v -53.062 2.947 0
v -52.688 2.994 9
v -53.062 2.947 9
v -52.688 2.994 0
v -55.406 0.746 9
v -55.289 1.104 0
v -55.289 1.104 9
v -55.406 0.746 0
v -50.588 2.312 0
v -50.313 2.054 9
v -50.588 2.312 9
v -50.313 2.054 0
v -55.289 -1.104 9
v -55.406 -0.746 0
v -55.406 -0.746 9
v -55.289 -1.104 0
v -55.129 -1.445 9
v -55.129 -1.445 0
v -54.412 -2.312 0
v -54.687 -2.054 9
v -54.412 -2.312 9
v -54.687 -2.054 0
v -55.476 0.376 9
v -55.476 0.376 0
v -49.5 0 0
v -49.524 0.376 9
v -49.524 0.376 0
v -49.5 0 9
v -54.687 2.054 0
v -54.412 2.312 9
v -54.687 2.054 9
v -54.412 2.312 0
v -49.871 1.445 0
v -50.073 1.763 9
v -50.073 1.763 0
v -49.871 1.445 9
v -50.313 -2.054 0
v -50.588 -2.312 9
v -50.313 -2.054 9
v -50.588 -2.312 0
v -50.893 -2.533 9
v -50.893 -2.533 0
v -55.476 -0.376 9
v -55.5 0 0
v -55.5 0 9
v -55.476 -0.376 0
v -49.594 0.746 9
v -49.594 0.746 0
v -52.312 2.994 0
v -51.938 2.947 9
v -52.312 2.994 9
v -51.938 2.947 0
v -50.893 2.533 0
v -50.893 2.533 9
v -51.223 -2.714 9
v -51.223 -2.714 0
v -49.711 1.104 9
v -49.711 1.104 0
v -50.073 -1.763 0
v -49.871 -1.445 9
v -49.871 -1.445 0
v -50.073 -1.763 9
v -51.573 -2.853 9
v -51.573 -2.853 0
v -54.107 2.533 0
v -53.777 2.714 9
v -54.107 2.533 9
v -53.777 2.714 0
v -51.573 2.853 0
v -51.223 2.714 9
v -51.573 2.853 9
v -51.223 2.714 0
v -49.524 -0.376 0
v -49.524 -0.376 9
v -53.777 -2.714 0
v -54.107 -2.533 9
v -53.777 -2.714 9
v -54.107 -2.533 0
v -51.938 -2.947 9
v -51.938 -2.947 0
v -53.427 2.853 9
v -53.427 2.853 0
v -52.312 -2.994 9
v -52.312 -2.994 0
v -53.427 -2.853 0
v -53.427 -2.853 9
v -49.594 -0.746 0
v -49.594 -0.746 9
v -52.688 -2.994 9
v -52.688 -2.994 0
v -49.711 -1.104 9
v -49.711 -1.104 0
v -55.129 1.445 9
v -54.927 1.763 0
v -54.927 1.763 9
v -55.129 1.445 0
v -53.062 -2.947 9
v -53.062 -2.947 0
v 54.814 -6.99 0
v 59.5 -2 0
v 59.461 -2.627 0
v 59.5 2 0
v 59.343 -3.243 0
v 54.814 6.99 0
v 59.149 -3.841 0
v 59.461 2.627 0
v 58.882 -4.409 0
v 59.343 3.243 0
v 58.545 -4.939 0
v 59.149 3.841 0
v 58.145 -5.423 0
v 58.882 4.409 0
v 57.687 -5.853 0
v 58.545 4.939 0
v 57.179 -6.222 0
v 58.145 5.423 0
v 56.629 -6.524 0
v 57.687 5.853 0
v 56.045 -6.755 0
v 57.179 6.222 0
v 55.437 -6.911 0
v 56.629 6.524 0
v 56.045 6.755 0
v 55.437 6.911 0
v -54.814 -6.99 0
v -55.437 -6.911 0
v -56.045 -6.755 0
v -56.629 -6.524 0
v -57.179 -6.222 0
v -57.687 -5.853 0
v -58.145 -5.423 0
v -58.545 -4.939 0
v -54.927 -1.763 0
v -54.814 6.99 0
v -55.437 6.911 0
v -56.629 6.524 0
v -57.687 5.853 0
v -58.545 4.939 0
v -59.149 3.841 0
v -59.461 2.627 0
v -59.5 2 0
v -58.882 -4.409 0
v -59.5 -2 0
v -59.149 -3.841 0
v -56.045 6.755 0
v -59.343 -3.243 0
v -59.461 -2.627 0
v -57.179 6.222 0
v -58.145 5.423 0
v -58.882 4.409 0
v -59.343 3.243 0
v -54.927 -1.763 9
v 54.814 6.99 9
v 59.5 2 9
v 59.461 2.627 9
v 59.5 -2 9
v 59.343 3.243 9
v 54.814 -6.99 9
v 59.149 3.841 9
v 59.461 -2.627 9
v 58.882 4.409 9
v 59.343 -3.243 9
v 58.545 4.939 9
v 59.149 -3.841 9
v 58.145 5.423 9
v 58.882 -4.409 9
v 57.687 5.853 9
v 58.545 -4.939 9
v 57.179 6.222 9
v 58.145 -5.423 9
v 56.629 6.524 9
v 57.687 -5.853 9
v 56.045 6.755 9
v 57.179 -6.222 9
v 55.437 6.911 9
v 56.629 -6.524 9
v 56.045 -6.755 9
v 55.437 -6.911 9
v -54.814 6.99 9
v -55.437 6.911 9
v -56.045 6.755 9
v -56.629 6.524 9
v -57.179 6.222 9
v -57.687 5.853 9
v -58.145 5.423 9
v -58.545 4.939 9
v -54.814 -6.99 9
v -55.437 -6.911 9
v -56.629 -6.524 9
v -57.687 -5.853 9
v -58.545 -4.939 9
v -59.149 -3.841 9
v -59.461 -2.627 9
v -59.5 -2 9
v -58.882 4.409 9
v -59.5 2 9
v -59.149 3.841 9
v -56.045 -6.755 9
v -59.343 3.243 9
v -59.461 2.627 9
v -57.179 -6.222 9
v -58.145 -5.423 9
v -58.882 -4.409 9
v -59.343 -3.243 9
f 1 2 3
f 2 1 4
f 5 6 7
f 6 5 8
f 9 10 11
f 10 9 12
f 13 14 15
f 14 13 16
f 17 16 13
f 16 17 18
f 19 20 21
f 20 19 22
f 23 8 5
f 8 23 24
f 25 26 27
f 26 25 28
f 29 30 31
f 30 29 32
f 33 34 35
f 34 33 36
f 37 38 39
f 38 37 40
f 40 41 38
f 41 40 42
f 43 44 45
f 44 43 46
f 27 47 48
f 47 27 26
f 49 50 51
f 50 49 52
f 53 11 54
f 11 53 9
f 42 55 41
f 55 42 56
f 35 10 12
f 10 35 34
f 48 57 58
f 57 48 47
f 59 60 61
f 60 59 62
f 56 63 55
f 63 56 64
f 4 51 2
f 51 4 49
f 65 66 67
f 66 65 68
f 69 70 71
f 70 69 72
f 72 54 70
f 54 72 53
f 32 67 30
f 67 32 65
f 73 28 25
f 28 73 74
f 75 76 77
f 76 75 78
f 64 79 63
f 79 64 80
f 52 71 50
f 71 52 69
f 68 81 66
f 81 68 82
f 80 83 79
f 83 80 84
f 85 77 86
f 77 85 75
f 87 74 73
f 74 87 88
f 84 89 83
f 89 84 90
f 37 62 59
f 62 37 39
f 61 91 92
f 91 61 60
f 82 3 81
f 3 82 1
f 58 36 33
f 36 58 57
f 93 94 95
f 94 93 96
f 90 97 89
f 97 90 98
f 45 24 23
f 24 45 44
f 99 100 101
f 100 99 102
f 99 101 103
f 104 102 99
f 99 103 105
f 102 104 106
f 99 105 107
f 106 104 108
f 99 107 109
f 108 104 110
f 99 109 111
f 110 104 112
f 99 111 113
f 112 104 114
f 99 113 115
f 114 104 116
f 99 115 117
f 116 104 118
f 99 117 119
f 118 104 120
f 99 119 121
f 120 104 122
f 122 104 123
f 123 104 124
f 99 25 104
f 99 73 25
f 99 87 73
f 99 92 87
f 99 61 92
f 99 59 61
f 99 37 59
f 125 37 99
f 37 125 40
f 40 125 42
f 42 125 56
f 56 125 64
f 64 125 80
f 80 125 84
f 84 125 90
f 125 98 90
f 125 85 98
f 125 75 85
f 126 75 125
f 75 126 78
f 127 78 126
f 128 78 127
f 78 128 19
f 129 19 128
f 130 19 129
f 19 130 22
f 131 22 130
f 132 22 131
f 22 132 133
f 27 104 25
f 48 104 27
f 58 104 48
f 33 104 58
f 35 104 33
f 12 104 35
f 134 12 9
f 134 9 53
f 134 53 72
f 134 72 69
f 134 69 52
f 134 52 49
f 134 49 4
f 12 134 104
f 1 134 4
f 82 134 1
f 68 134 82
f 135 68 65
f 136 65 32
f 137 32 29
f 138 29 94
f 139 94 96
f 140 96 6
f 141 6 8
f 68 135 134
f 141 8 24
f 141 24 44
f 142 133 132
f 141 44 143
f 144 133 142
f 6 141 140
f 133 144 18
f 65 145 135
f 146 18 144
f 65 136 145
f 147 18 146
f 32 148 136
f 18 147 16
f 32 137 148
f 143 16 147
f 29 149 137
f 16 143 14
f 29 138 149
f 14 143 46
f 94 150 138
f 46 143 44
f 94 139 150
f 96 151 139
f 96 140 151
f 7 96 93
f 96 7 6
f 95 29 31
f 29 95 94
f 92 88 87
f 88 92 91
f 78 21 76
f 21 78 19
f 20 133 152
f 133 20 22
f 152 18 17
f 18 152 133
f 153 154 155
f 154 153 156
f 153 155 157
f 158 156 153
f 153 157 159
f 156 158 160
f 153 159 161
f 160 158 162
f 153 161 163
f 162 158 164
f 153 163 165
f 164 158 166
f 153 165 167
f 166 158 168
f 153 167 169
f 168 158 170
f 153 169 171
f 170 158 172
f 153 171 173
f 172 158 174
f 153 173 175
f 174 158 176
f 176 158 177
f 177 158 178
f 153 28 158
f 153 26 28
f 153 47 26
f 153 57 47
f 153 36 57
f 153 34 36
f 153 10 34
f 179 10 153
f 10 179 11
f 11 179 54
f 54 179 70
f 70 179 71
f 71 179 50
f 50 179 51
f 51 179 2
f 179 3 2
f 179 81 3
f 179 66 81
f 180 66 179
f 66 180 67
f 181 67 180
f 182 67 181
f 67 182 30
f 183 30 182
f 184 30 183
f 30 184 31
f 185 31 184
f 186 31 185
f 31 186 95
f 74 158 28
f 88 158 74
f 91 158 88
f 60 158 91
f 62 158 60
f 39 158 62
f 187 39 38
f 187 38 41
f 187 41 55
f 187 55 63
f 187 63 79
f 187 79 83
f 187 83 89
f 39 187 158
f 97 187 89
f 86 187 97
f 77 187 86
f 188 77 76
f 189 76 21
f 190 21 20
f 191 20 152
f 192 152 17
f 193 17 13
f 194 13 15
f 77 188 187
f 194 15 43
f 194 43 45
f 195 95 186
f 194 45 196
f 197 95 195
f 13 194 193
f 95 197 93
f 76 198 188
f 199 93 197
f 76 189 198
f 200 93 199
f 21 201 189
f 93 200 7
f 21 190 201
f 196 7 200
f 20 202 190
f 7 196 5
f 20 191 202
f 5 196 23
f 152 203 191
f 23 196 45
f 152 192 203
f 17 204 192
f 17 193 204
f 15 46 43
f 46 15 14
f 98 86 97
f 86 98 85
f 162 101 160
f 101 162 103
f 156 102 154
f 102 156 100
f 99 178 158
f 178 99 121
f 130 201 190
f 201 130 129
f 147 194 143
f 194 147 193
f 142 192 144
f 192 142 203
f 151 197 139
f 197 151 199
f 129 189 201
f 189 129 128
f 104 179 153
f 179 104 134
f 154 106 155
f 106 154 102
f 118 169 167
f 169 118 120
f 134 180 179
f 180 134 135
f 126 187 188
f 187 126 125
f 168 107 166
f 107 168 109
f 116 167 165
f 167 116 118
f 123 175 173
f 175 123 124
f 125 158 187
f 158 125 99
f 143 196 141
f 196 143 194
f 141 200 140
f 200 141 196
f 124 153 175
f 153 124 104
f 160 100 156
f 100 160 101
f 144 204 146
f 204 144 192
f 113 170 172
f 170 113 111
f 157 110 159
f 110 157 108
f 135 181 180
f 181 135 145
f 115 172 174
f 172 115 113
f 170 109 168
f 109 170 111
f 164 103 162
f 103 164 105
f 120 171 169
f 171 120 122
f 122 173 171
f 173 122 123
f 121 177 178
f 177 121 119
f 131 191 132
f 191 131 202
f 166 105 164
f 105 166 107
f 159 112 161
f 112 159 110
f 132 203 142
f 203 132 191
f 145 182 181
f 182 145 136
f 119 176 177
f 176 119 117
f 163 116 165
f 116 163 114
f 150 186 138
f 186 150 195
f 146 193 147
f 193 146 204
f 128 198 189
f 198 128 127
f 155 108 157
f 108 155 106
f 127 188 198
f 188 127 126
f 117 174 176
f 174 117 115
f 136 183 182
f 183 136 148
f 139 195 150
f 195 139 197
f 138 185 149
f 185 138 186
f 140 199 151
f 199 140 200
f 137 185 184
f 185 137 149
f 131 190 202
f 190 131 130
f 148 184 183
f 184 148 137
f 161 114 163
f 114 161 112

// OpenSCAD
$fn = 50;


difference() {
	union() {
		hull() {
			translate(v = [-54.5000000000, 2.0000000000, 0]) {
				cylinder(h = 9, r = 5);
			}
			translate(v = [54.5000000000, 2.0000000000, 0]) {
				cylinder(h = 9, r = 5);
			}
			translate(v = [-54.5000000000, -2.0000000000, 0]) {
				cylinder(h = 9, r = 5);
			}
			translate(v = [54.5000000000, -2.0000000000, 0]) {
				cylinder(h = 9, r = 5);
			}
		}
	}
	union() {
		translate(v = [-52.5000000000, 0.0000000000, 0]) {
			cylinder(h = 9, r = 3.0000000000);
		}
		translate(v = [-52.5000000000, 0.0000000000, 0]) {
			cylinder(h = 9, r = 1.5000000000);
		}
		translate(v = [-52.5000000000, 0.0000000000, 0]) {
			cylinder(h = 9, r = 1.5000000000);
		}
		translate(v = [-52.5000000000, 0.0000000000, 0]) {
			cylinder(h = 9, r = 1.5000000000);
		}
	}
}
